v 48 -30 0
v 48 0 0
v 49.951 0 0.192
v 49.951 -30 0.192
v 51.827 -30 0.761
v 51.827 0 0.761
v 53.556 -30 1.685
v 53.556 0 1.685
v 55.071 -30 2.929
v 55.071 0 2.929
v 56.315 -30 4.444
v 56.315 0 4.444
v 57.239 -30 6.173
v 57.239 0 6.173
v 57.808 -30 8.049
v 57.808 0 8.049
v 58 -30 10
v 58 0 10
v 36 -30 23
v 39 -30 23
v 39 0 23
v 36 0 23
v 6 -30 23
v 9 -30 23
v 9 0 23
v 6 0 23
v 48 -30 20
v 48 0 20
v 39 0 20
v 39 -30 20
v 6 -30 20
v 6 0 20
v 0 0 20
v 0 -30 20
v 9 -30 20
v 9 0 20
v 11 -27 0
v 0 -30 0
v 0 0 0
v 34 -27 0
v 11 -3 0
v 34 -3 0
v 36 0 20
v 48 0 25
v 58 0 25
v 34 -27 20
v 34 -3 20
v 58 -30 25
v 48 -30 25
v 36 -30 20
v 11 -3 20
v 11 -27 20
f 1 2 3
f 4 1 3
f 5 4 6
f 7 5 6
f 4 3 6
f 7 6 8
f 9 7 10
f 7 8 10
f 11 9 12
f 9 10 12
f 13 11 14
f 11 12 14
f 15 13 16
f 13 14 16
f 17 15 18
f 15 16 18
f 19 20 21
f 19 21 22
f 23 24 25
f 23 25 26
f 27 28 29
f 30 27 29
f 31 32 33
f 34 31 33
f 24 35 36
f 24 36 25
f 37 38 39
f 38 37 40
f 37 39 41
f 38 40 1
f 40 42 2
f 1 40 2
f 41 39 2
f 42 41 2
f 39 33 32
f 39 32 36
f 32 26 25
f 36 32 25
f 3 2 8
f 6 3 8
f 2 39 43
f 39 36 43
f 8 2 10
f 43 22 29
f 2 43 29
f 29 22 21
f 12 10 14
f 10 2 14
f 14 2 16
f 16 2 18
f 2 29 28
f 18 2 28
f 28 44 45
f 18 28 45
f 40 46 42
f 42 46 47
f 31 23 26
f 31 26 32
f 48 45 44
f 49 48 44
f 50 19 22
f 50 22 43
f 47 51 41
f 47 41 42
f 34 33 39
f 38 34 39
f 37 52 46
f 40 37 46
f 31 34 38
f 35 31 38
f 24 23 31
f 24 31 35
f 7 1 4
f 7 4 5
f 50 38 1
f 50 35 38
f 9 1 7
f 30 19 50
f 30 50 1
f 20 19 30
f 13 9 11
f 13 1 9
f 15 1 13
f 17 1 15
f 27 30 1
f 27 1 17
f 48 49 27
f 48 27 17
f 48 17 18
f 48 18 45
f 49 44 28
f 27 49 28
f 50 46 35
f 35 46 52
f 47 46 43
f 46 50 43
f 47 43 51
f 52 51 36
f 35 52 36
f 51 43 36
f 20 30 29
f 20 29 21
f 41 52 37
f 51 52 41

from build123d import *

# Parameters (mm, degrees)
F1_DEPTH = 30
F2_W     = 23
F2_H     = 24
F3_DEPTH = 20.001


with BuildPart() as f1:
    # F0 (on Front) → F1 (new body)
    with BuildSketch(Plane.XZ):
        with BuildLine():
            Line((0, 20), (0, 0))
            Line((0, 0), (48, 0))
            ThreePointArc((48, 0), (55.071068, 2.928932), (58, 10))
            Line((58, 10), (58, 25))
            Line((58, 25), (48, 25))
            Line((48, 25), (48, 20))
            Line((48, 20), (39, 20))
            Line((39, 20), (39, 23))
            Line((39, 23), (36, 23))
            Line((36, 23), (36, 20))
            Line((36, 20), (9, 20))
            Line((9, 20), (9, 23))
            Line((9, 23), (6, 23))
            Line((6, 23), (6, 20))
            Line((6, 20), (0, 20))
        make_face()
    extrude(amount=F1_DEPTH)

    # F2 (on face) → F3 (cut, through all)
    with BuildSketch(Plane.XY.offset(20)):
        with Locations((22.5, -15)):
            Rectangle(F2_W, F2_H)
    extrude(amount=-F3_DEPTH, mode=Mode.SUBTRACT)


solid = f1.part
